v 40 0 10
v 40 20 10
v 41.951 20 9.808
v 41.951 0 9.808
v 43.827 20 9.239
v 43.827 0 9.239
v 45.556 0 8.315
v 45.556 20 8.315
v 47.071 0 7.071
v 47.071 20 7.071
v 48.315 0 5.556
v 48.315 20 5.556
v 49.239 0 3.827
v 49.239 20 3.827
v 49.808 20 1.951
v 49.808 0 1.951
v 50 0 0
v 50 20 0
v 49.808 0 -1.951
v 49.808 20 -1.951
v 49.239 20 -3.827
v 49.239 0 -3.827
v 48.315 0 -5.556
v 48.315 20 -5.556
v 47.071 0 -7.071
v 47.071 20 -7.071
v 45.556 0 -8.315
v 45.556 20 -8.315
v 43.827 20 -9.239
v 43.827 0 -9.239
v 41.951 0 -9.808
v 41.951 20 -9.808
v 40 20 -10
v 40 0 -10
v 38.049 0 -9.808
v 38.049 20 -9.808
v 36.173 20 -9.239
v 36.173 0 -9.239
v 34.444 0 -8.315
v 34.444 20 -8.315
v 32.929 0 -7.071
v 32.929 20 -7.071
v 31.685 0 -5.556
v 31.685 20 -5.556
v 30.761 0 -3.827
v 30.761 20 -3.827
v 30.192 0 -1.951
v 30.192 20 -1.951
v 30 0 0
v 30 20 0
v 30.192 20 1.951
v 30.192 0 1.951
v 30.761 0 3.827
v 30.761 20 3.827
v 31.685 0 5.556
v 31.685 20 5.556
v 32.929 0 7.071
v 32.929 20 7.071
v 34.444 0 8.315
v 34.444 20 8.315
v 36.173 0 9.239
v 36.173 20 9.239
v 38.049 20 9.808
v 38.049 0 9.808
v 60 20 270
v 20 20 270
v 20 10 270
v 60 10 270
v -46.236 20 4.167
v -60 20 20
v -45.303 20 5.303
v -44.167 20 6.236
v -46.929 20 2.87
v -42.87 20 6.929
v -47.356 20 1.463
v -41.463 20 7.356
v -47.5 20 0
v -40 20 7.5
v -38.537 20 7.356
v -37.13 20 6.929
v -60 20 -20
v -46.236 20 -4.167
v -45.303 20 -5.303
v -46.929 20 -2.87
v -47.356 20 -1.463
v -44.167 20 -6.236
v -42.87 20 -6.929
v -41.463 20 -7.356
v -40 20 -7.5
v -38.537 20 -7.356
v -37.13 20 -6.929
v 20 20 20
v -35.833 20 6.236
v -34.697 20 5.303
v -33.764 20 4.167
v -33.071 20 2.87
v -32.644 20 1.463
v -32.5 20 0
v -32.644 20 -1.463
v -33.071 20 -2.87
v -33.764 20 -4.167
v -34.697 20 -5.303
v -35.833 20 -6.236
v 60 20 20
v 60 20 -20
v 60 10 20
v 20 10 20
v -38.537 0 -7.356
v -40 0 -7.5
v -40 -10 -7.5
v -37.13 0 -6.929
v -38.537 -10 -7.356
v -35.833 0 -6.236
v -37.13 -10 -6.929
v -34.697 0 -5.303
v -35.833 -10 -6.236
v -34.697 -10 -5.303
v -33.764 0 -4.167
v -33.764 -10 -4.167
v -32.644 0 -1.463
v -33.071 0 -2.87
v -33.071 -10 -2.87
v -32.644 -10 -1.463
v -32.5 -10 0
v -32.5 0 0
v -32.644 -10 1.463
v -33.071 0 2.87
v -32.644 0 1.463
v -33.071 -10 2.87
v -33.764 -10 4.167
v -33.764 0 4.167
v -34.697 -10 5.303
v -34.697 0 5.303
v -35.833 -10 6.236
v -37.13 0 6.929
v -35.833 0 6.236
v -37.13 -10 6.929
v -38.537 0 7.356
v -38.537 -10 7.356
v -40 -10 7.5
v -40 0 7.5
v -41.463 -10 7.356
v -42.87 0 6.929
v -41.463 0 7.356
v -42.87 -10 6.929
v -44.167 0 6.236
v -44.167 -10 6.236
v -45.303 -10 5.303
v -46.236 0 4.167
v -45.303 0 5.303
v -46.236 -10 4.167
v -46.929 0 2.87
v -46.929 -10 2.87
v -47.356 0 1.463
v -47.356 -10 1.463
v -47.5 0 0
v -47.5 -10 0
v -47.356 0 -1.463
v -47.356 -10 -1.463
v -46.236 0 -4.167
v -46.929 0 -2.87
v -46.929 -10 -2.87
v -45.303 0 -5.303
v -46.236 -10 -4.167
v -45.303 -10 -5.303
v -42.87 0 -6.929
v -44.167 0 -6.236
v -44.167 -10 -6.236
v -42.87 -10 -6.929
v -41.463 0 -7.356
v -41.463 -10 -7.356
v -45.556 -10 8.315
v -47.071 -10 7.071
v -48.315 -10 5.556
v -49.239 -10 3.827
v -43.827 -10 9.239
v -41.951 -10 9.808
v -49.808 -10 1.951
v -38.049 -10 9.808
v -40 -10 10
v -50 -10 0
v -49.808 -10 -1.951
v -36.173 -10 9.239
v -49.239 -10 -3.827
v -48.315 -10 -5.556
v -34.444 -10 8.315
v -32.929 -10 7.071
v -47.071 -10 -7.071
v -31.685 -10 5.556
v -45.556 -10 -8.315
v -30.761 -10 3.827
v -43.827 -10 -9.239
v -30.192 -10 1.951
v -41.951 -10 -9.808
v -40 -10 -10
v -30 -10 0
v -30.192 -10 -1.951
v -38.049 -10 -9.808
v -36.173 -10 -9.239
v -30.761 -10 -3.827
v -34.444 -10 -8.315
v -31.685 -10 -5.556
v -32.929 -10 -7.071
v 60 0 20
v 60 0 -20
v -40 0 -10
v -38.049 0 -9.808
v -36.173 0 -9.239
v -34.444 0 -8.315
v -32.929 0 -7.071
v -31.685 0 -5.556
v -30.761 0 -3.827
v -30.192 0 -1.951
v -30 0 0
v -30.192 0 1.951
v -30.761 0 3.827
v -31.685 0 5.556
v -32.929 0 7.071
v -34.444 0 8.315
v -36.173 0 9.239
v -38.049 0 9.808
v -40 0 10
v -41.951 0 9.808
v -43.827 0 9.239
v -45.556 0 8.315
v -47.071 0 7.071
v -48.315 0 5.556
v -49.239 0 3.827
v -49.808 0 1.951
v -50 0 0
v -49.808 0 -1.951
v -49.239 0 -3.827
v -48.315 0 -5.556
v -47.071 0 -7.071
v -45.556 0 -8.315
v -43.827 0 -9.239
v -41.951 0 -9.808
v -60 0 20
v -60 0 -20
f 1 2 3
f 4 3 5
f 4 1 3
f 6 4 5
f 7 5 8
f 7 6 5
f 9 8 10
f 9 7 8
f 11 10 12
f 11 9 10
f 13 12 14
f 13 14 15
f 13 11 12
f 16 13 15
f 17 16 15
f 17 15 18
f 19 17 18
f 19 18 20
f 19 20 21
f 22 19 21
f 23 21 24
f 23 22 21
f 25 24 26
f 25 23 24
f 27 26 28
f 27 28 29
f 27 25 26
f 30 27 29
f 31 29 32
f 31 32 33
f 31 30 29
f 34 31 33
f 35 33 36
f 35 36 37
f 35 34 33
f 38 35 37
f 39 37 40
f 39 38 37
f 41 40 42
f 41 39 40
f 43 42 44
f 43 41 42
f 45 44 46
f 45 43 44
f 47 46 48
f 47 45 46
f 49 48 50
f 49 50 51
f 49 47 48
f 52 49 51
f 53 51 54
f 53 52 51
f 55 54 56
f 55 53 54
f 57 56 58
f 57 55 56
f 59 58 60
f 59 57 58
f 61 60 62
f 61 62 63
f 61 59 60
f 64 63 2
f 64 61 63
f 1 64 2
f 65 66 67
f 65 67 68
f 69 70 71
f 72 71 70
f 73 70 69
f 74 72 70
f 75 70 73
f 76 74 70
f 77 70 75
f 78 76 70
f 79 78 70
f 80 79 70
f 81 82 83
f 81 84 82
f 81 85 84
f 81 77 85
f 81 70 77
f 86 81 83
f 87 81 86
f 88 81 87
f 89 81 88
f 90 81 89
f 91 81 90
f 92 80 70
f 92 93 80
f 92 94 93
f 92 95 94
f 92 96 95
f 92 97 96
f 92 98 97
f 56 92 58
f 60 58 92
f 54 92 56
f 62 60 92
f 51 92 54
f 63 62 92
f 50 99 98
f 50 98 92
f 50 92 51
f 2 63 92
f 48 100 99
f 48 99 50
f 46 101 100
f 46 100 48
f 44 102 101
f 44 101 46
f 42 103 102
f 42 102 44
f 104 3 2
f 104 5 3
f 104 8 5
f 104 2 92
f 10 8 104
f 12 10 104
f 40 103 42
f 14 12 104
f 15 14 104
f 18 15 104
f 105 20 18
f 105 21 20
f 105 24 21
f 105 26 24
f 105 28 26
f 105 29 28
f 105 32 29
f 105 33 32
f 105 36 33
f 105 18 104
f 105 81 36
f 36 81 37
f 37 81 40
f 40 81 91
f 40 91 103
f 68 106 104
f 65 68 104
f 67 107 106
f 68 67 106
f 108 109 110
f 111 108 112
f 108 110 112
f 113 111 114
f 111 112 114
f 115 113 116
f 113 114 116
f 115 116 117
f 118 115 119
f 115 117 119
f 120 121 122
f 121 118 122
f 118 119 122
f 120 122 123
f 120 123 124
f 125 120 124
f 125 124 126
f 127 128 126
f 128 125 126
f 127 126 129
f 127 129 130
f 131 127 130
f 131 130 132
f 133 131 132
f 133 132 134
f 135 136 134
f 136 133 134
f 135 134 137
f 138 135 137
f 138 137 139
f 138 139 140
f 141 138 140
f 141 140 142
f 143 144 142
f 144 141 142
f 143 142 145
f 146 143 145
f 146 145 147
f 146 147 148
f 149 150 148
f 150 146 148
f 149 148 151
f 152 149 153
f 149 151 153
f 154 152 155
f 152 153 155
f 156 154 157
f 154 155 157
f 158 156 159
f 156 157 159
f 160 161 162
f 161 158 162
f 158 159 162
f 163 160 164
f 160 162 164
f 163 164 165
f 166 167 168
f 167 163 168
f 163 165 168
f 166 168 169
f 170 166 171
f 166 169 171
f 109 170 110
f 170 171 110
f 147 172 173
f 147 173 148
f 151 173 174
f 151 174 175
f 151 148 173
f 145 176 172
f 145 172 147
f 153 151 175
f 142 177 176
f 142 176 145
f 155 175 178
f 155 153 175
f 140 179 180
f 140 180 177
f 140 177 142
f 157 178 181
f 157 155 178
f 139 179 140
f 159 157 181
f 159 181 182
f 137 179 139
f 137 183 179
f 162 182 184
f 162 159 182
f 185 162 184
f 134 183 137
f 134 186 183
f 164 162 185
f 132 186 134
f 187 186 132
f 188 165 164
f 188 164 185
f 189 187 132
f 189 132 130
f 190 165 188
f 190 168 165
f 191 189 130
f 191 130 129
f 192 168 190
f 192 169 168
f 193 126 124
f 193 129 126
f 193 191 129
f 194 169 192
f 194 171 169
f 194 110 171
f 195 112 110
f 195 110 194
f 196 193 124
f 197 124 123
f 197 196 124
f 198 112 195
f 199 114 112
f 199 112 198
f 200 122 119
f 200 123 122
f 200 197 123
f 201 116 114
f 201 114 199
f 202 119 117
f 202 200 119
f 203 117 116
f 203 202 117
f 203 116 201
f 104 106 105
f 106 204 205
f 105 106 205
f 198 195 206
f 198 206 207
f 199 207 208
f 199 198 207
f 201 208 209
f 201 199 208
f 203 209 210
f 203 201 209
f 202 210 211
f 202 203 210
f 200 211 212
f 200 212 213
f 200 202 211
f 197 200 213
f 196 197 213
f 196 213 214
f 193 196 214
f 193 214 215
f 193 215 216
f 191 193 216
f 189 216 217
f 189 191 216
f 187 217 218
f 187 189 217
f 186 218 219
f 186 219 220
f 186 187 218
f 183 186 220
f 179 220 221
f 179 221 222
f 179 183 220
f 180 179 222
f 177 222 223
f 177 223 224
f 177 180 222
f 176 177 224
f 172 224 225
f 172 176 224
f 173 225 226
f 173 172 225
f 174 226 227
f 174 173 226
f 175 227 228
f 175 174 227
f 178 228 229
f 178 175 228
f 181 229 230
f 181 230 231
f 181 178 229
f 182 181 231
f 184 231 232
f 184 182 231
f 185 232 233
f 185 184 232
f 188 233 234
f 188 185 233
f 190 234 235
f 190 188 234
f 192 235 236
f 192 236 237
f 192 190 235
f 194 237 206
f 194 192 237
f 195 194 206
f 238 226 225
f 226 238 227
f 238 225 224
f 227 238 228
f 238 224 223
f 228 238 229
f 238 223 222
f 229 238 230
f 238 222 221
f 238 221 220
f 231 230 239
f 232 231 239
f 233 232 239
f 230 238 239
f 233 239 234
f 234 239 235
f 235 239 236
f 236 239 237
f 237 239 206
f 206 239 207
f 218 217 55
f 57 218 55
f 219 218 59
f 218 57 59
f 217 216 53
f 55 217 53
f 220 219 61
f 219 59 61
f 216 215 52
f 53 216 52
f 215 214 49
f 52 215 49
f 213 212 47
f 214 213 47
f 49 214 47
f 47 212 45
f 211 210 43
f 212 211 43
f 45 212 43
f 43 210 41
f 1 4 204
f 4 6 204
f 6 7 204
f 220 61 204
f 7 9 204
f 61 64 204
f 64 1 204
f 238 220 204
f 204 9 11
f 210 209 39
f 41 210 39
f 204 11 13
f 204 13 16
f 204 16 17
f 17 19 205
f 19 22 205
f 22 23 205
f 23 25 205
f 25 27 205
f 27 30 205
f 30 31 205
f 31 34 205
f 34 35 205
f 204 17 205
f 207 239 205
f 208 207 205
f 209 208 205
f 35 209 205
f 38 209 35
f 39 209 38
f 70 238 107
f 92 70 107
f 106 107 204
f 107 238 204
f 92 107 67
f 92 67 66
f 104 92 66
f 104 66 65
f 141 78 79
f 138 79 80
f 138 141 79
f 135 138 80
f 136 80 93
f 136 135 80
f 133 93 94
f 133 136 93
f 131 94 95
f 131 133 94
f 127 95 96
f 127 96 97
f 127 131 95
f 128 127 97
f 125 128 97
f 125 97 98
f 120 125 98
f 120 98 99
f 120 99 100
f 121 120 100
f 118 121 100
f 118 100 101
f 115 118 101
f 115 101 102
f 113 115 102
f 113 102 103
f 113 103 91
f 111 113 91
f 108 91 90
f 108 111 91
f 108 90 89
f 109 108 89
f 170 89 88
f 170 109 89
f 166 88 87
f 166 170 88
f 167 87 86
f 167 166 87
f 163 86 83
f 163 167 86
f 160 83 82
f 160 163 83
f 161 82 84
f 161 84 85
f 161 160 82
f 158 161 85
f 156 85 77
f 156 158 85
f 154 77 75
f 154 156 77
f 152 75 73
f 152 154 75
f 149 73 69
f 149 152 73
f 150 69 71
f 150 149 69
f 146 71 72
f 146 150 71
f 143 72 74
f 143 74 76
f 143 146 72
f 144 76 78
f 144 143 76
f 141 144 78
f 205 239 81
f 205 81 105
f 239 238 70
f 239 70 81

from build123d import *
from build123d.topology import SkipClean

# Parameters (mm, degrees)
SKETCH1_W           = 120
SKETCH1_H           = 40
SKETCH1_R           = 7.5
SKETCH1_R_2         = 10
BOSS_EXTRUDE1_DEPTH = 20
BOSS_EXTRUDE2_START = 10
SKETCH2_R           = 10
SKETCH2_R_2         = 7.5
BOSS_EXTRUDE2_DEPTH = 10
SKETCH3_W           = 40
SKETCH3_H           = 10
BOSS_EXTRUDE3_DEPTH = 250


with BuildPart() as part:
    # Sketch1 → Boss-Extrude1 (new body)
    with BuildSketch(Plane(origin=(0, 0, 0), x_dir=(1, 0, 0), z_dir=(0, 1, 0))):
        Rectangle(SKETCH1_W, SKETCH1_H)
        with Locations(Location((-40, 0, 0), (0, 0, 270))):
            Circle(SKETCH1_R, mode=Mode.SUBTRACT)
        with Locations(Location((40, 0, 0), (0, 0, 270))):
            Circle(SKETCH1_R_2, mode=Mode.SUBTRACT)
    extrude(amount=BOSS_EXTRUDE1_DEPTH)

    # Sketch2 → Boss-Extrude2 (add)
    with SkipClean():  # the faces are left unmerged after this step: merging them gives an invalid solid
        with BuildSketch(Plane.XZ.offset(BOSS_EXTRUDE2_START)):
            with Locations(Location((-40, 0, 0), (0, 0, 270))):
                Circle(SKETCH2_R)
            with Locations(Location((-40, 0, 0), (0, 0, 270))):
                Circle(SKETCH2_R_2, mode=Mode.SUBTRACT)
        extrude(amount=-BOSS_EXTRUDE2_DEPTH)

    # Sketch3 → Boss-Extrude3 (add)
    with SkipClean():  # the faces are left unmerged after this step: merging them gives an invalid solid
        with BuildSketch(Plane.XY.offset(20)):
            with Locations((40, 15)):
                Rectangle(SKETCH3_W, SKETCH3_H)
        extrude(amount=BOSS_EXTRUDE3_DEPTH)


solid = part.part
